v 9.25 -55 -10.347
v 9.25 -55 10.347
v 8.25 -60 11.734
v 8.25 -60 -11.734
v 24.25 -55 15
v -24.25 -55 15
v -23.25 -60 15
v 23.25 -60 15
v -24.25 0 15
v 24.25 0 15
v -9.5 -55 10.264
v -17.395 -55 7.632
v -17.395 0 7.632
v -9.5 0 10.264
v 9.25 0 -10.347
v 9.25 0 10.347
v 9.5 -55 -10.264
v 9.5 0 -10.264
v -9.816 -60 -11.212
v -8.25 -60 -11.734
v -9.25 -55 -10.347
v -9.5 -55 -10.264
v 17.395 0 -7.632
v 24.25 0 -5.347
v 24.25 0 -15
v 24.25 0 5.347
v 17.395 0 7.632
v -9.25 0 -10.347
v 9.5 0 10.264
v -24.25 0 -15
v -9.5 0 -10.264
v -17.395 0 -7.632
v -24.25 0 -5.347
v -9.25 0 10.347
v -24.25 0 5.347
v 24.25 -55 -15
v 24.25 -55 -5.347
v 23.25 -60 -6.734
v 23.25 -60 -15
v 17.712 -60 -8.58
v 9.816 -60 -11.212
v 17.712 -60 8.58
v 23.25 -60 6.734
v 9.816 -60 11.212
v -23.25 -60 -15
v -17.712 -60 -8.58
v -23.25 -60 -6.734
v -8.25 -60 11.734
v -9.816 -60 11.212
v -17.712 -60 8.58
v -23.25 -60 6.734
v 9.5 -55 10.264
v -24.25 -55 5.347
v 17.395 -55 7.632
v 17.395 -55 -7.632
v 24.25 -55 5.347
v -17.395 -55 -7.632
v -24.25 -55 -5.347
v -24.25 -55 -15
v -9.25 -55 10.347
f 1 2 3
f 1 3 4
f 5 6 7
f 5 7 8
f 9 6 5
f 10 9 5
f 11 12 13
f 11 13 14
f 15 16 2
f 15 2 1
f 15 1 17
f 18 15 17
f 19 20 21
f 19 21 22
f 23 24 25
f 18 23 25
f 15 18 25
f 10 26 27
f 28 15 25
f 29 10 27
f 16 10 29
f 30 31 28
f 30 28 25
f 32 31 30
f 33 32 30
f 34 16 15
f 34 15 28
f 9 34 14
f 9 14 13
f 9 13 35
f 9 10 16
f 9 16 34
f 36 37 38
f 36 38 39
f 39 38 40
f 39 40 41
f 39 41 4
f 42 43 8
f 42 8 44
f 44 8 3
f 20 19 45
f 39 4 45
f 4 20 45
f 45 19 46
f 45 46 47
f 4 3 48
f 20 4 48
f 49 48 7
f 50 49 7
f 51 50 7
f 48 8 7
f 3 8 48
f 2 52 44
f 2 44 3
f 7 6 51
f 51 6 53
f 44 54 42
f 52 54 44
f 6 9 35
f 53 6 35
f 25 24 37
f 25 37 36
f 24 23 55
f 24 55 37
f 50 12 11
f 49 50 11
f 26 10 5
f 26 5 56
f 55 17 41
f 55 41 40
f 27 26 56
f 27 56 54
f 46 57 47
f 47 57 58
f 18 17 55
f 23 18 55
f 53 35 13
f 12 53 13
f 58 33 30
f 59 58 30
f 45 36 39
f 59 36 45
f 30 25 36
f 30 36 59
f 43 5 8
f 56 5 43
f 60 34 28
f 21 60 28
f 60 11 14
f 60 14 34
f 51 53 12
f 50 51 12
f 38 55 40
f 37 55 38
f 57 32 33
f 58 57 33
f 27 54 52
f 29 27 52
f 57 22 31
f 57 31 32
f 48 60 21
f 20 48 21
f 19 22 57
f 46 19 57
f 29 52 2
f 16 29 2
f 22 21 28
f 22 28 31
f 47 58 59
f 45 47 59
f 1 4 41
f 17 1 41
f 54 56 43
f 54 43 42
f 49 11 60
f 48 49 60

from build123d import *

# Parameters (mm, degrees)
F1_DEPTH = 60
F3_SIZE2 = 5
F3_SIZE  = 1


# Not quite as in the source:
# - a feature names something its author has since deleted; it is built from what else it names


with BuildPart() as f1:
    # F0 (on Front) → F1 (new body)
    with BuildSketch(Plane.XZ):
        Polygon((-9.5, 15), (-24.25, 15), (-24.25, 9.9166666667), (-17.3952847075, 7.6317615692), (-9.5, 10.2635231383), align=None)
        Polygon((-17.3952847075, 7.6317615692), (-24.25, 9.9166666667), (-24.25, 5.3468564717), align=None)
        Polygon((0, 15), (-9.25, 15), (-9.25, 10.3468564717), (-9.25, 4.9166666667), (-9.25, -10.3468564717), (-9.25, -15), (0, -15), align=None)
        Polygon((-9.25, 15), (-9.5, 15), (-9.5, 10.2635231383), (-9.25, 10.3468564717), align=None)
        Polygon((-17.3952847075, -7.6317615692), (-24.25, -9.9166666667), (-24.25, -15), (-9.5, -15), (-9.5, -10.2635231383), align=None)
        Polygon((-24.25, -5.3468564717), (-24.25, -9.9166666667), (-17.3952847075, -7.6317615692), align=None)
        Polygon((-9.25, -10.3468564717), (-9.5, -10.2635231383), (-9.5, -15), (-9.25, -15), align=None)
    extrude(amount=F1_DEPTH)

    # F2: F1 across face


with BuildPart() as f1_1:
    add(f1.part)
    add(f1.part.mirror(Plane(origin=(0, -30, 0), x_dir=(0, 1, 0), z_dir=(1, 0, 0))))

    # F3
    f3_edges = [f1_1.edges().sort_by_distance(p)[0] for p in [
        (-24.25, -60, 10.173428),
        (9.25, -60, 0),
        (16.75, -60, 7.846856),
        (24.25, -60, 10.173428),
        (-16.75, -60, 7.846856),
        (-9.25, -60, 0),
        (-16.75, -60, -7.846856),
        (-24.25, -60, -10.173428),
        (16.75, -60, -7.846856),
        (24.25, -60, -10.173428),
    ]]
    f3_side = f1_1.faces().sort_by_distance((0, -60, 0))[0]
    chamfer(f3_edges, length=F3_SIZE, length2=F3_SIZE2, reference=f3_side)


solid = f1_1.part
